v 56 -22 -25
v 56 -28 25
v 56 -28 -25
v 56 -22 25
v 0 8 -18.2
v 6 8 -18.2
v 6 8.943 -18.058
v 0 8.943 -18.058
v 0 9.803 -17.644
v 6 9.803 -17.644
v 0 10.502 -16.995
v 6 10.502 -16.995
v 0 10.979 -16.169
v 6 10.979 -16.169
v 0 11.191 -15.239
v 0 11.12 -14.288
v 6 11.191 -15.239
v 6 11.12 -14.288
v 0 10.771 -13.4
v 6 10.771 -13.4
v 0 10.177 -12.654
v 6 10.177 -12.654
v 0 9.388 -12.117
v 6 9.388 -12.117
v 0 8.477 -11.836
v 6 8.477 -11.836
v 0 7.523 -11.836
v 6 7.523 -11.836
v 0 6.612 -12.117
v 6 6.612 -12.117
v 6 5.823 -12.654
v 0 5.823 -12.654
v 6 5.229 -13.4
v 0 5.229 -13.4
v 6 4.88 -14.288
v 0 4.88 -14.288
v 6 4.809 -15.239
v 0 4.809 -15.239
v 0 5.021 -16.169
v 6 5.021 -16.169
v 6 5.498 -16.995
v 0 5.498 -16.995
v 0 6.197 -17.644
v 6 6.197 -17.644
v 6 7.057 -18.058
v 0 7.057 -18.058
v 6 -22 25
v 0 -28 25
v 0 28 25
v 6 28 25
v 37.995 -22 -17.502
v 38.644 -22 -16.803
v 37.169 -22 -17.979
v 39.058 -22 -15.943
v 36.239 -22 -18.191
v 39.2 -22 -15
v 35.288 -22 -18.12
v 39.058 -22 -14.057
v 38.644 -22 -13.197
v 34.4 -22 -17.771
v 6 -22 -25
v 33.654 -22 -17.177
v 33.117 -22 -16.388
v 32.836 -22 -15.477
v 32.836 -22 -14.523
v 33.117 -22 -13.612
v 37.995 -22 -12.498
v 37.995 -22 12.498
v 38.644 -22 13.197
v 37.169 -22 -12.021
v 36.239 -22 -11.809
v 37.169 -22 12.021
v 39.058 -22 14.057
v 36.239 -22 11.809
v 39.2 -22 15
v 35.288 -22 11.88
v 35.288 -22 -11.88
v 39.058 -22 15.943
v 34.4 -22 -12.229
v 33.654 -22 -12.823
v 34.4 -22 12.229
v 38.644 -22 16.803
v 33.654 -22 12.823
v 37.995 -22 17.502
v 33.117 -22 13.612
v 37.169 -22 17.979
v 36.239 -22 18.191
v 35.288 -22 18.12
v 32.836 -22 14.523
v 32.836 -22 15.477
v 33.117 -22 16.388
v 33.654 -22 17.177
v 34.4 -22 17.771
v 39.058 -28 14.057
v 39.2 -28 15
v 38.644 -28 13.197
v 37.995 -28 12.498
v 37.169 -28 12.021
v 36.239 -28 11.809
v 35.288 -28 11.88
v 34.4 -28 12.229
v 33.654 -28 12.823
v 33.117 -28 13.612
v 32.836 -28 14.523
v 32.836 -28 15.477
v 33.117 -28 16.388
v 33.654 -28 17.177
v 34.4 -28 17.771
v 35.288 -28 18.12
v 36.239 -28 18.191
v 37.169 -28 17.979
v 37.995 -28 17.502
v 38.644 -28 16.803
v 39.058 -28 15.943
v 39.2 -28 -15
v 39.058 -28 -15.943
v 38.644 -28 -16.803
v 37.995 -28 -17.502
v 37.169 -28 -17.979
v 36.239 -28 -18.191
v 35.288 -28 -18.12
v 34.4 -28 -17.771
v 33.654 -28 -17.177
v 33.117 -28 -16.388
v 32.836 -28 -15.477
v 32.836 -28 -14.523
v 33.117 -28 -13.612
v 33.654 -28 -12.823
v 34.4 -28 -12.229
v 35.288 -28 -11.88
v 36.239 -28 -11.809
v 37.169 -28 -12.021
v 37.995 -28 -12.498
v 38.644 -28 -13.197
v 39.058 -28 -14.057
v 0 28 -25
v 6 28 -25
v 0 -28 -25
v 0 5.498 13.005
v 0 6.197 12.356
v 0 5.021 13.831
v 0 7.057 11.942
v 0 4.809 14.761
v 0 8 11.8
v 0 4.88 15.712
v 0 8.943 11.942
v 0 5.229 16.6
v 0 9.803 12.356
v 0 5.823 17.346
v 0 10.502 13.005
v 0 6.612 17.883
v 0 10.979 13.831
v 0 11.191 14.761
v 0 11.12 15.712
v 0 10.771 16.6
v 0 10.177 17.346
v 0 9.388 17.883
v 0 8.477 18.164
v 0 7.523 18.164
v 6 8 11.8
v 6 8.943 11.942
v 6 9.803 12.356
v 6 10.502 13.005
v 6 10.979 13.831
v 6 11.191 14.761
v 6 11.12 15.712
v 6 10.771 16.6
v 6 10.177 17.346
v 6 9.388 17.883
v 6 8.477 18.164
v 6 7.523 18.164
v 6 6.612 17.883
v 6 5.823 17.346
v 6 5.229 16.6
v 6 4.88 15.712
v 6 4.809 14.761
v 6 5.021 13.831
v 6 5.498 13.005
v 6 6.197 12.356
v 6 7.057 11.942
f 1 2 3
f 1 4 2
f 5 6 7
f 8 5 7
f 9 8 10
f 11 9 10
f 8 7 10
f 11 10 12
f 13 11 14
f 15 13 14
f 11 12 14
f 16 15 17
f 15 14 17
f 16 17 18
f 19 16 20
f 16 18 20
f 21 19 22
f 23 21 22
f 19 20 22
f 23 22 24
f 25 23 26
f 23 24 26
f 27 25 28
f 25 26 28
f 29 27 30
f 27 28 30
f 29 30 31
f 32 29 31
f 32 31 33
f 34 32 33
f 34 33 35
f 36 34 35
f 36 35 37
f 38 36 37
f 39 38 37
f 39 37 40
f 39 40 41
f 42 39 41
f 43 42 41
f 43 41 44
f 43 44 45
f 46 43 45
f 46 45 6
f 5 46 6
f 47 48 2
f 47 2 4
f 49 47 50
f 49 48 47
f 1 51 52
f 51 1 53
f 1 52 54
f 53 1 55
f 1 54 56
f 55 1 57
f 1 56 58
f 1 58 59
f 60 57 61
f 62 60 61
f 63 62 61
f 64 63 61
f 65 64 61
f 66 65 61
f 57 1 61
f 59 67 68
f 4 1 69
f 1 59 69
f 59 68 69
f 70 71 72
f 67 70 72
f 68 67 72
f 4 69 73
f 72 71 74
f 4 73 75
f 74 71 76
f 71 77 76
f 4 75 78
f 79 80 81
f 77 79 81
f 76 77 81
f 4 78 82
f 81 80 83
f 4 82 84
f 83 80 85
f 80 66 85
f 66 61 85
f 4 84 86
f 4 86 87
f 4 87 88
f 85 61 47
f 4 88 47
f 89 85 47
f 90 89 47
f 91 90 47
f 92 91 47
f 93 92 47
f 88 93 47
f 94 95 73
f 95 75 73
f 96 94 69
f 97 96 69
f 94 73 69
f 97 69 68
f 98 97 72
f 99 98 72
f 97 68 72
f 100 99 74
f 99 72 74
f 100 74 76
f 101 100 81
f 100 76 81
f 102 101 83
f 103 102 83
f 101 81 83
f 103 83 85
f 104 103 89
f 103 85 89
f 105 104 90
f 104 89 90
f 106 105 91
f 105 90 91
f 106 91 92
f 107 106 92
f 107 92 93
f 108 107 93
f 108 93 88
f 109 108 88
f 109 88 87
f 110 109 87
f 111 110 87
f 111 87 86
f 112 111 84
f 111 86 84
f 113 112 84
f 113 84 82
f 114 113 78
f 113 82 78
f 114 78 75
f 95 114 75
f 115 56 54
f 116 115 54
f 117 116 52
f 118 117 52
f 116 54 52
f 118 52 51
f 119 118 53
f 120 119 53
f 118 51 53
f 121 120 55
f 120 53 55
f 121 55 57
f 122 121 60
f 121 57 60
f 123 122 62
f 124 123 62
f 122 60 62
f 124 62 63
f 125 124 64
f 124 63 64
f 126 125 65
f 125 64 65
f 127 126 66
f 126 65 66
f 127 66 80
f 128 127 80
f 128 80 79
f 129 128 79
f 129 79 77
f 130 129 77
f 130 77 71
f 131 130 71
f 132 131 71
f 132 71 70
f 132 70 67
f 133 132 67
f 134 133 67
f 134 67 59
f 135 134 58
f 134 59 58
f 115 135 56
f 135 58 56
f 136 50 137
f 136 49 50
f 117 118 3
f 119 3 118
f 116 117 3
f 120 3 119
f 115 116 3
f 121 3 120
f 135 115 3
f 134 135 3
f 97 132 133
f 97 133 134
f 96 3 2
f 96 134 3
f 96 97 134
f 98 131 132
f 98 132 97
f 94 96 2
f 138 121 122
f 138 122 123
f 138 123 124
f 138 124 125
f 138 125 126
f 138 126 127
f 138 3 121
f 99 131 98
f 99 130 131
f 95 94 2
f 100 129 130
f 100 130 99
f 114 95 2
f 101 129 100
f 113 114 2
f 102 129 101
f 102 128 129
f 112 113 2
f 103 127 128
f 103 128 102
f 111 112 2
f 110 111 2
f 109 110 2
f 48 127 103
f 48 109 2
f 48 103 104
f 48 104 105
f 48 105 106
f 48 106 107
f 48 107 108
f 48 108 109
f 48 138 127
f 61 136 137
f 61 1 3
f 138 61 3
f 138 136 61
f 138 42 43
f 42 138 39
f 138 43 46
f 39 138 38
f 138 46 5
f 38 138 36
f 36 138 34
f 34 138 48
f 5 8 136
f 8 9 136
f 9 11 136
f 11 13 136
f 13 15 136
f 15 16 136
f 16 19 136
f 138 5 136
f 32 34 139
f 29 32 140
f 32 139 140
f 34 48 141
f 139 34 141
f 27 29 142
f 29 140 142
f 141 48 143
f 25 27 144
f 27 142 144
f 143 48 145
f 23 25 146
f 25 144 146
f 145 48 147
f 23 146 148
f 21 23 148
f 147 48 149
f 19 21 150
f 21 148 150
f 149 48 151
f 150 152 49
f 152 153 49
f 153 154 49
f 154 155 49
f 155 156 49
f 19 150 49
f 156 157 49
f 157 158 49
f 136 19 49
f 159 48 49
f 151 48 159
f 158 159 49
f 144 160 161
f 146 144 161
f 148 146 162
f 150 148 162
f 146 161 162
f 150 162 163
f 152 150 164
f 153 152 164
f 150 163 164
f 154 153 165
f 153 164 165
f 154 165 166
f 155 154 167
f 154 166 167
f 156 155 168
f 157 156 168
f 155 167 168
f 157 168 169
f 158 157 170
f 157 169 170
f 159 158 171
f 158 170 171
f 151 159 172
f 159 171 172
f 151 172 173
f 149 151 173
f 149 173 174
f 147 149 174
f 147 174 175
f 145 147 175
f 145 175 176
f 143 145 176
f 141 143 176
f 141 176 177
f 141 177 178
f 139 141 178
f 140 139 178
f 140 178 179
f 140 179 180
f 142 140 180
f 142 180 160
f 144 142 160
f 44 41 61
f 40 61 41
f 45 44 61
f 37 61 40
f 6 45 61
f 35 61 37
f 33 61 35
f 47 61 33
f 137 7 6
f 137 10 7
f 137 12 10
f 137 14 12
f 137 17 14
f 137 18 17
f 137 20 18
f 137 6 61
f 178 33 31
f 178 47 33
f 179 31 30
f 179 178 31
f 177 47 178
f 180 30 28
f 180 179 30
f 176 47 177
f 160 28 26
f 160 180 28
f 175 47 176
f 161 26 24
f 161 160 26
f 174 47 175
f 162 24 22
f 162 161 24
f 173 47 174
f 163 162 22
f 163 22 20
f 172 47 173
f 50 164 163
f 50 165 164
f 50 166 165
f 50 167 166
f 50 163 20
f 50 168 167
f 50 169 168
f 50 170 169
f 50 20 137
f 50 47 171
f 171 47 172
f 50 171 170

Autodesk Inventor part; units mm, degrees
ref_plane "YZ Plane" through (0, 0, 0) normal (1, 0, 0) x (0, 1, 0)
ref_plane "XZ Plane" through (0, 0, 0) normal (0, 1, 0) x (-1, 0, 0)
ref_plane "XY Plane" through (0, 0, 0) normal (0, 0, 1) x (1, 0, 0)
sketch "Sketch1" plane through (0, 0, 0) normal (1, 0, 0) x (0, 1, 0)
  line L0 (-28, 25) -> (28, 25)
  line L1 (28, 25) -> (28, -25)
  line L2 (28, -25) -> (-28, -25)
  line L3 (-28, -25) -> (-28, 25)
  line L4 (-28, 25) -> (28, -25) construction
  line L5 (28, 25) -> (-28, -25) construction
  point P0 (0, 0)
  dimension "d0" = 56
  dimension "d1" = 50
extrude "Extrusion1" add sketch "Sketch1" along normal blind 6
sketch "Sketch2" plane through (6, 0, 0) normal (1, 0, 0) x (0, 0, -1)
  line L0 (-25, -28) -> (25, -28)
  line L1 (25, -28) -> (25, -22)
  line L2 (25, -22) -> (-25, -22)
  line L3 (-25, -22) -> (-25, -28)
  point P0 (0, 0)
  dimension "d4" = 50
  dimension "d5" = 6
extrude "Extrusion2" add sketch "Sketch2" along normal blind 50
sketch "Sketch3" plane through (56, -22, 25) normal (0, 1, 0) x (1, 0, 0)
  circle A0 centre (-20, 10) radius 3.2
  circle A1 centre (-20, 40) radius 3.2
  point P0 (-56, 25)
  dimension "d9" = 6.4
  dimension "d10" = 6.4
sketch "Sketch4" plane through (6, 0, 0) normal (1, 0, 0) x (0, 0, -1)
  circle A0 centre (-15, 8) radius 3.2
  circle A1 centre (15, 8) radius 3.2
  point P0 (0, 0)
  dimension "d11" = 6.4
  dimension "d12" = 6.4
extrude "Extrusion3" cut sketch "Sketch4" against normal through all
extrude "Extrusion4" cut sketch "Sketch3" against normal through all
properties part number "Angle"
